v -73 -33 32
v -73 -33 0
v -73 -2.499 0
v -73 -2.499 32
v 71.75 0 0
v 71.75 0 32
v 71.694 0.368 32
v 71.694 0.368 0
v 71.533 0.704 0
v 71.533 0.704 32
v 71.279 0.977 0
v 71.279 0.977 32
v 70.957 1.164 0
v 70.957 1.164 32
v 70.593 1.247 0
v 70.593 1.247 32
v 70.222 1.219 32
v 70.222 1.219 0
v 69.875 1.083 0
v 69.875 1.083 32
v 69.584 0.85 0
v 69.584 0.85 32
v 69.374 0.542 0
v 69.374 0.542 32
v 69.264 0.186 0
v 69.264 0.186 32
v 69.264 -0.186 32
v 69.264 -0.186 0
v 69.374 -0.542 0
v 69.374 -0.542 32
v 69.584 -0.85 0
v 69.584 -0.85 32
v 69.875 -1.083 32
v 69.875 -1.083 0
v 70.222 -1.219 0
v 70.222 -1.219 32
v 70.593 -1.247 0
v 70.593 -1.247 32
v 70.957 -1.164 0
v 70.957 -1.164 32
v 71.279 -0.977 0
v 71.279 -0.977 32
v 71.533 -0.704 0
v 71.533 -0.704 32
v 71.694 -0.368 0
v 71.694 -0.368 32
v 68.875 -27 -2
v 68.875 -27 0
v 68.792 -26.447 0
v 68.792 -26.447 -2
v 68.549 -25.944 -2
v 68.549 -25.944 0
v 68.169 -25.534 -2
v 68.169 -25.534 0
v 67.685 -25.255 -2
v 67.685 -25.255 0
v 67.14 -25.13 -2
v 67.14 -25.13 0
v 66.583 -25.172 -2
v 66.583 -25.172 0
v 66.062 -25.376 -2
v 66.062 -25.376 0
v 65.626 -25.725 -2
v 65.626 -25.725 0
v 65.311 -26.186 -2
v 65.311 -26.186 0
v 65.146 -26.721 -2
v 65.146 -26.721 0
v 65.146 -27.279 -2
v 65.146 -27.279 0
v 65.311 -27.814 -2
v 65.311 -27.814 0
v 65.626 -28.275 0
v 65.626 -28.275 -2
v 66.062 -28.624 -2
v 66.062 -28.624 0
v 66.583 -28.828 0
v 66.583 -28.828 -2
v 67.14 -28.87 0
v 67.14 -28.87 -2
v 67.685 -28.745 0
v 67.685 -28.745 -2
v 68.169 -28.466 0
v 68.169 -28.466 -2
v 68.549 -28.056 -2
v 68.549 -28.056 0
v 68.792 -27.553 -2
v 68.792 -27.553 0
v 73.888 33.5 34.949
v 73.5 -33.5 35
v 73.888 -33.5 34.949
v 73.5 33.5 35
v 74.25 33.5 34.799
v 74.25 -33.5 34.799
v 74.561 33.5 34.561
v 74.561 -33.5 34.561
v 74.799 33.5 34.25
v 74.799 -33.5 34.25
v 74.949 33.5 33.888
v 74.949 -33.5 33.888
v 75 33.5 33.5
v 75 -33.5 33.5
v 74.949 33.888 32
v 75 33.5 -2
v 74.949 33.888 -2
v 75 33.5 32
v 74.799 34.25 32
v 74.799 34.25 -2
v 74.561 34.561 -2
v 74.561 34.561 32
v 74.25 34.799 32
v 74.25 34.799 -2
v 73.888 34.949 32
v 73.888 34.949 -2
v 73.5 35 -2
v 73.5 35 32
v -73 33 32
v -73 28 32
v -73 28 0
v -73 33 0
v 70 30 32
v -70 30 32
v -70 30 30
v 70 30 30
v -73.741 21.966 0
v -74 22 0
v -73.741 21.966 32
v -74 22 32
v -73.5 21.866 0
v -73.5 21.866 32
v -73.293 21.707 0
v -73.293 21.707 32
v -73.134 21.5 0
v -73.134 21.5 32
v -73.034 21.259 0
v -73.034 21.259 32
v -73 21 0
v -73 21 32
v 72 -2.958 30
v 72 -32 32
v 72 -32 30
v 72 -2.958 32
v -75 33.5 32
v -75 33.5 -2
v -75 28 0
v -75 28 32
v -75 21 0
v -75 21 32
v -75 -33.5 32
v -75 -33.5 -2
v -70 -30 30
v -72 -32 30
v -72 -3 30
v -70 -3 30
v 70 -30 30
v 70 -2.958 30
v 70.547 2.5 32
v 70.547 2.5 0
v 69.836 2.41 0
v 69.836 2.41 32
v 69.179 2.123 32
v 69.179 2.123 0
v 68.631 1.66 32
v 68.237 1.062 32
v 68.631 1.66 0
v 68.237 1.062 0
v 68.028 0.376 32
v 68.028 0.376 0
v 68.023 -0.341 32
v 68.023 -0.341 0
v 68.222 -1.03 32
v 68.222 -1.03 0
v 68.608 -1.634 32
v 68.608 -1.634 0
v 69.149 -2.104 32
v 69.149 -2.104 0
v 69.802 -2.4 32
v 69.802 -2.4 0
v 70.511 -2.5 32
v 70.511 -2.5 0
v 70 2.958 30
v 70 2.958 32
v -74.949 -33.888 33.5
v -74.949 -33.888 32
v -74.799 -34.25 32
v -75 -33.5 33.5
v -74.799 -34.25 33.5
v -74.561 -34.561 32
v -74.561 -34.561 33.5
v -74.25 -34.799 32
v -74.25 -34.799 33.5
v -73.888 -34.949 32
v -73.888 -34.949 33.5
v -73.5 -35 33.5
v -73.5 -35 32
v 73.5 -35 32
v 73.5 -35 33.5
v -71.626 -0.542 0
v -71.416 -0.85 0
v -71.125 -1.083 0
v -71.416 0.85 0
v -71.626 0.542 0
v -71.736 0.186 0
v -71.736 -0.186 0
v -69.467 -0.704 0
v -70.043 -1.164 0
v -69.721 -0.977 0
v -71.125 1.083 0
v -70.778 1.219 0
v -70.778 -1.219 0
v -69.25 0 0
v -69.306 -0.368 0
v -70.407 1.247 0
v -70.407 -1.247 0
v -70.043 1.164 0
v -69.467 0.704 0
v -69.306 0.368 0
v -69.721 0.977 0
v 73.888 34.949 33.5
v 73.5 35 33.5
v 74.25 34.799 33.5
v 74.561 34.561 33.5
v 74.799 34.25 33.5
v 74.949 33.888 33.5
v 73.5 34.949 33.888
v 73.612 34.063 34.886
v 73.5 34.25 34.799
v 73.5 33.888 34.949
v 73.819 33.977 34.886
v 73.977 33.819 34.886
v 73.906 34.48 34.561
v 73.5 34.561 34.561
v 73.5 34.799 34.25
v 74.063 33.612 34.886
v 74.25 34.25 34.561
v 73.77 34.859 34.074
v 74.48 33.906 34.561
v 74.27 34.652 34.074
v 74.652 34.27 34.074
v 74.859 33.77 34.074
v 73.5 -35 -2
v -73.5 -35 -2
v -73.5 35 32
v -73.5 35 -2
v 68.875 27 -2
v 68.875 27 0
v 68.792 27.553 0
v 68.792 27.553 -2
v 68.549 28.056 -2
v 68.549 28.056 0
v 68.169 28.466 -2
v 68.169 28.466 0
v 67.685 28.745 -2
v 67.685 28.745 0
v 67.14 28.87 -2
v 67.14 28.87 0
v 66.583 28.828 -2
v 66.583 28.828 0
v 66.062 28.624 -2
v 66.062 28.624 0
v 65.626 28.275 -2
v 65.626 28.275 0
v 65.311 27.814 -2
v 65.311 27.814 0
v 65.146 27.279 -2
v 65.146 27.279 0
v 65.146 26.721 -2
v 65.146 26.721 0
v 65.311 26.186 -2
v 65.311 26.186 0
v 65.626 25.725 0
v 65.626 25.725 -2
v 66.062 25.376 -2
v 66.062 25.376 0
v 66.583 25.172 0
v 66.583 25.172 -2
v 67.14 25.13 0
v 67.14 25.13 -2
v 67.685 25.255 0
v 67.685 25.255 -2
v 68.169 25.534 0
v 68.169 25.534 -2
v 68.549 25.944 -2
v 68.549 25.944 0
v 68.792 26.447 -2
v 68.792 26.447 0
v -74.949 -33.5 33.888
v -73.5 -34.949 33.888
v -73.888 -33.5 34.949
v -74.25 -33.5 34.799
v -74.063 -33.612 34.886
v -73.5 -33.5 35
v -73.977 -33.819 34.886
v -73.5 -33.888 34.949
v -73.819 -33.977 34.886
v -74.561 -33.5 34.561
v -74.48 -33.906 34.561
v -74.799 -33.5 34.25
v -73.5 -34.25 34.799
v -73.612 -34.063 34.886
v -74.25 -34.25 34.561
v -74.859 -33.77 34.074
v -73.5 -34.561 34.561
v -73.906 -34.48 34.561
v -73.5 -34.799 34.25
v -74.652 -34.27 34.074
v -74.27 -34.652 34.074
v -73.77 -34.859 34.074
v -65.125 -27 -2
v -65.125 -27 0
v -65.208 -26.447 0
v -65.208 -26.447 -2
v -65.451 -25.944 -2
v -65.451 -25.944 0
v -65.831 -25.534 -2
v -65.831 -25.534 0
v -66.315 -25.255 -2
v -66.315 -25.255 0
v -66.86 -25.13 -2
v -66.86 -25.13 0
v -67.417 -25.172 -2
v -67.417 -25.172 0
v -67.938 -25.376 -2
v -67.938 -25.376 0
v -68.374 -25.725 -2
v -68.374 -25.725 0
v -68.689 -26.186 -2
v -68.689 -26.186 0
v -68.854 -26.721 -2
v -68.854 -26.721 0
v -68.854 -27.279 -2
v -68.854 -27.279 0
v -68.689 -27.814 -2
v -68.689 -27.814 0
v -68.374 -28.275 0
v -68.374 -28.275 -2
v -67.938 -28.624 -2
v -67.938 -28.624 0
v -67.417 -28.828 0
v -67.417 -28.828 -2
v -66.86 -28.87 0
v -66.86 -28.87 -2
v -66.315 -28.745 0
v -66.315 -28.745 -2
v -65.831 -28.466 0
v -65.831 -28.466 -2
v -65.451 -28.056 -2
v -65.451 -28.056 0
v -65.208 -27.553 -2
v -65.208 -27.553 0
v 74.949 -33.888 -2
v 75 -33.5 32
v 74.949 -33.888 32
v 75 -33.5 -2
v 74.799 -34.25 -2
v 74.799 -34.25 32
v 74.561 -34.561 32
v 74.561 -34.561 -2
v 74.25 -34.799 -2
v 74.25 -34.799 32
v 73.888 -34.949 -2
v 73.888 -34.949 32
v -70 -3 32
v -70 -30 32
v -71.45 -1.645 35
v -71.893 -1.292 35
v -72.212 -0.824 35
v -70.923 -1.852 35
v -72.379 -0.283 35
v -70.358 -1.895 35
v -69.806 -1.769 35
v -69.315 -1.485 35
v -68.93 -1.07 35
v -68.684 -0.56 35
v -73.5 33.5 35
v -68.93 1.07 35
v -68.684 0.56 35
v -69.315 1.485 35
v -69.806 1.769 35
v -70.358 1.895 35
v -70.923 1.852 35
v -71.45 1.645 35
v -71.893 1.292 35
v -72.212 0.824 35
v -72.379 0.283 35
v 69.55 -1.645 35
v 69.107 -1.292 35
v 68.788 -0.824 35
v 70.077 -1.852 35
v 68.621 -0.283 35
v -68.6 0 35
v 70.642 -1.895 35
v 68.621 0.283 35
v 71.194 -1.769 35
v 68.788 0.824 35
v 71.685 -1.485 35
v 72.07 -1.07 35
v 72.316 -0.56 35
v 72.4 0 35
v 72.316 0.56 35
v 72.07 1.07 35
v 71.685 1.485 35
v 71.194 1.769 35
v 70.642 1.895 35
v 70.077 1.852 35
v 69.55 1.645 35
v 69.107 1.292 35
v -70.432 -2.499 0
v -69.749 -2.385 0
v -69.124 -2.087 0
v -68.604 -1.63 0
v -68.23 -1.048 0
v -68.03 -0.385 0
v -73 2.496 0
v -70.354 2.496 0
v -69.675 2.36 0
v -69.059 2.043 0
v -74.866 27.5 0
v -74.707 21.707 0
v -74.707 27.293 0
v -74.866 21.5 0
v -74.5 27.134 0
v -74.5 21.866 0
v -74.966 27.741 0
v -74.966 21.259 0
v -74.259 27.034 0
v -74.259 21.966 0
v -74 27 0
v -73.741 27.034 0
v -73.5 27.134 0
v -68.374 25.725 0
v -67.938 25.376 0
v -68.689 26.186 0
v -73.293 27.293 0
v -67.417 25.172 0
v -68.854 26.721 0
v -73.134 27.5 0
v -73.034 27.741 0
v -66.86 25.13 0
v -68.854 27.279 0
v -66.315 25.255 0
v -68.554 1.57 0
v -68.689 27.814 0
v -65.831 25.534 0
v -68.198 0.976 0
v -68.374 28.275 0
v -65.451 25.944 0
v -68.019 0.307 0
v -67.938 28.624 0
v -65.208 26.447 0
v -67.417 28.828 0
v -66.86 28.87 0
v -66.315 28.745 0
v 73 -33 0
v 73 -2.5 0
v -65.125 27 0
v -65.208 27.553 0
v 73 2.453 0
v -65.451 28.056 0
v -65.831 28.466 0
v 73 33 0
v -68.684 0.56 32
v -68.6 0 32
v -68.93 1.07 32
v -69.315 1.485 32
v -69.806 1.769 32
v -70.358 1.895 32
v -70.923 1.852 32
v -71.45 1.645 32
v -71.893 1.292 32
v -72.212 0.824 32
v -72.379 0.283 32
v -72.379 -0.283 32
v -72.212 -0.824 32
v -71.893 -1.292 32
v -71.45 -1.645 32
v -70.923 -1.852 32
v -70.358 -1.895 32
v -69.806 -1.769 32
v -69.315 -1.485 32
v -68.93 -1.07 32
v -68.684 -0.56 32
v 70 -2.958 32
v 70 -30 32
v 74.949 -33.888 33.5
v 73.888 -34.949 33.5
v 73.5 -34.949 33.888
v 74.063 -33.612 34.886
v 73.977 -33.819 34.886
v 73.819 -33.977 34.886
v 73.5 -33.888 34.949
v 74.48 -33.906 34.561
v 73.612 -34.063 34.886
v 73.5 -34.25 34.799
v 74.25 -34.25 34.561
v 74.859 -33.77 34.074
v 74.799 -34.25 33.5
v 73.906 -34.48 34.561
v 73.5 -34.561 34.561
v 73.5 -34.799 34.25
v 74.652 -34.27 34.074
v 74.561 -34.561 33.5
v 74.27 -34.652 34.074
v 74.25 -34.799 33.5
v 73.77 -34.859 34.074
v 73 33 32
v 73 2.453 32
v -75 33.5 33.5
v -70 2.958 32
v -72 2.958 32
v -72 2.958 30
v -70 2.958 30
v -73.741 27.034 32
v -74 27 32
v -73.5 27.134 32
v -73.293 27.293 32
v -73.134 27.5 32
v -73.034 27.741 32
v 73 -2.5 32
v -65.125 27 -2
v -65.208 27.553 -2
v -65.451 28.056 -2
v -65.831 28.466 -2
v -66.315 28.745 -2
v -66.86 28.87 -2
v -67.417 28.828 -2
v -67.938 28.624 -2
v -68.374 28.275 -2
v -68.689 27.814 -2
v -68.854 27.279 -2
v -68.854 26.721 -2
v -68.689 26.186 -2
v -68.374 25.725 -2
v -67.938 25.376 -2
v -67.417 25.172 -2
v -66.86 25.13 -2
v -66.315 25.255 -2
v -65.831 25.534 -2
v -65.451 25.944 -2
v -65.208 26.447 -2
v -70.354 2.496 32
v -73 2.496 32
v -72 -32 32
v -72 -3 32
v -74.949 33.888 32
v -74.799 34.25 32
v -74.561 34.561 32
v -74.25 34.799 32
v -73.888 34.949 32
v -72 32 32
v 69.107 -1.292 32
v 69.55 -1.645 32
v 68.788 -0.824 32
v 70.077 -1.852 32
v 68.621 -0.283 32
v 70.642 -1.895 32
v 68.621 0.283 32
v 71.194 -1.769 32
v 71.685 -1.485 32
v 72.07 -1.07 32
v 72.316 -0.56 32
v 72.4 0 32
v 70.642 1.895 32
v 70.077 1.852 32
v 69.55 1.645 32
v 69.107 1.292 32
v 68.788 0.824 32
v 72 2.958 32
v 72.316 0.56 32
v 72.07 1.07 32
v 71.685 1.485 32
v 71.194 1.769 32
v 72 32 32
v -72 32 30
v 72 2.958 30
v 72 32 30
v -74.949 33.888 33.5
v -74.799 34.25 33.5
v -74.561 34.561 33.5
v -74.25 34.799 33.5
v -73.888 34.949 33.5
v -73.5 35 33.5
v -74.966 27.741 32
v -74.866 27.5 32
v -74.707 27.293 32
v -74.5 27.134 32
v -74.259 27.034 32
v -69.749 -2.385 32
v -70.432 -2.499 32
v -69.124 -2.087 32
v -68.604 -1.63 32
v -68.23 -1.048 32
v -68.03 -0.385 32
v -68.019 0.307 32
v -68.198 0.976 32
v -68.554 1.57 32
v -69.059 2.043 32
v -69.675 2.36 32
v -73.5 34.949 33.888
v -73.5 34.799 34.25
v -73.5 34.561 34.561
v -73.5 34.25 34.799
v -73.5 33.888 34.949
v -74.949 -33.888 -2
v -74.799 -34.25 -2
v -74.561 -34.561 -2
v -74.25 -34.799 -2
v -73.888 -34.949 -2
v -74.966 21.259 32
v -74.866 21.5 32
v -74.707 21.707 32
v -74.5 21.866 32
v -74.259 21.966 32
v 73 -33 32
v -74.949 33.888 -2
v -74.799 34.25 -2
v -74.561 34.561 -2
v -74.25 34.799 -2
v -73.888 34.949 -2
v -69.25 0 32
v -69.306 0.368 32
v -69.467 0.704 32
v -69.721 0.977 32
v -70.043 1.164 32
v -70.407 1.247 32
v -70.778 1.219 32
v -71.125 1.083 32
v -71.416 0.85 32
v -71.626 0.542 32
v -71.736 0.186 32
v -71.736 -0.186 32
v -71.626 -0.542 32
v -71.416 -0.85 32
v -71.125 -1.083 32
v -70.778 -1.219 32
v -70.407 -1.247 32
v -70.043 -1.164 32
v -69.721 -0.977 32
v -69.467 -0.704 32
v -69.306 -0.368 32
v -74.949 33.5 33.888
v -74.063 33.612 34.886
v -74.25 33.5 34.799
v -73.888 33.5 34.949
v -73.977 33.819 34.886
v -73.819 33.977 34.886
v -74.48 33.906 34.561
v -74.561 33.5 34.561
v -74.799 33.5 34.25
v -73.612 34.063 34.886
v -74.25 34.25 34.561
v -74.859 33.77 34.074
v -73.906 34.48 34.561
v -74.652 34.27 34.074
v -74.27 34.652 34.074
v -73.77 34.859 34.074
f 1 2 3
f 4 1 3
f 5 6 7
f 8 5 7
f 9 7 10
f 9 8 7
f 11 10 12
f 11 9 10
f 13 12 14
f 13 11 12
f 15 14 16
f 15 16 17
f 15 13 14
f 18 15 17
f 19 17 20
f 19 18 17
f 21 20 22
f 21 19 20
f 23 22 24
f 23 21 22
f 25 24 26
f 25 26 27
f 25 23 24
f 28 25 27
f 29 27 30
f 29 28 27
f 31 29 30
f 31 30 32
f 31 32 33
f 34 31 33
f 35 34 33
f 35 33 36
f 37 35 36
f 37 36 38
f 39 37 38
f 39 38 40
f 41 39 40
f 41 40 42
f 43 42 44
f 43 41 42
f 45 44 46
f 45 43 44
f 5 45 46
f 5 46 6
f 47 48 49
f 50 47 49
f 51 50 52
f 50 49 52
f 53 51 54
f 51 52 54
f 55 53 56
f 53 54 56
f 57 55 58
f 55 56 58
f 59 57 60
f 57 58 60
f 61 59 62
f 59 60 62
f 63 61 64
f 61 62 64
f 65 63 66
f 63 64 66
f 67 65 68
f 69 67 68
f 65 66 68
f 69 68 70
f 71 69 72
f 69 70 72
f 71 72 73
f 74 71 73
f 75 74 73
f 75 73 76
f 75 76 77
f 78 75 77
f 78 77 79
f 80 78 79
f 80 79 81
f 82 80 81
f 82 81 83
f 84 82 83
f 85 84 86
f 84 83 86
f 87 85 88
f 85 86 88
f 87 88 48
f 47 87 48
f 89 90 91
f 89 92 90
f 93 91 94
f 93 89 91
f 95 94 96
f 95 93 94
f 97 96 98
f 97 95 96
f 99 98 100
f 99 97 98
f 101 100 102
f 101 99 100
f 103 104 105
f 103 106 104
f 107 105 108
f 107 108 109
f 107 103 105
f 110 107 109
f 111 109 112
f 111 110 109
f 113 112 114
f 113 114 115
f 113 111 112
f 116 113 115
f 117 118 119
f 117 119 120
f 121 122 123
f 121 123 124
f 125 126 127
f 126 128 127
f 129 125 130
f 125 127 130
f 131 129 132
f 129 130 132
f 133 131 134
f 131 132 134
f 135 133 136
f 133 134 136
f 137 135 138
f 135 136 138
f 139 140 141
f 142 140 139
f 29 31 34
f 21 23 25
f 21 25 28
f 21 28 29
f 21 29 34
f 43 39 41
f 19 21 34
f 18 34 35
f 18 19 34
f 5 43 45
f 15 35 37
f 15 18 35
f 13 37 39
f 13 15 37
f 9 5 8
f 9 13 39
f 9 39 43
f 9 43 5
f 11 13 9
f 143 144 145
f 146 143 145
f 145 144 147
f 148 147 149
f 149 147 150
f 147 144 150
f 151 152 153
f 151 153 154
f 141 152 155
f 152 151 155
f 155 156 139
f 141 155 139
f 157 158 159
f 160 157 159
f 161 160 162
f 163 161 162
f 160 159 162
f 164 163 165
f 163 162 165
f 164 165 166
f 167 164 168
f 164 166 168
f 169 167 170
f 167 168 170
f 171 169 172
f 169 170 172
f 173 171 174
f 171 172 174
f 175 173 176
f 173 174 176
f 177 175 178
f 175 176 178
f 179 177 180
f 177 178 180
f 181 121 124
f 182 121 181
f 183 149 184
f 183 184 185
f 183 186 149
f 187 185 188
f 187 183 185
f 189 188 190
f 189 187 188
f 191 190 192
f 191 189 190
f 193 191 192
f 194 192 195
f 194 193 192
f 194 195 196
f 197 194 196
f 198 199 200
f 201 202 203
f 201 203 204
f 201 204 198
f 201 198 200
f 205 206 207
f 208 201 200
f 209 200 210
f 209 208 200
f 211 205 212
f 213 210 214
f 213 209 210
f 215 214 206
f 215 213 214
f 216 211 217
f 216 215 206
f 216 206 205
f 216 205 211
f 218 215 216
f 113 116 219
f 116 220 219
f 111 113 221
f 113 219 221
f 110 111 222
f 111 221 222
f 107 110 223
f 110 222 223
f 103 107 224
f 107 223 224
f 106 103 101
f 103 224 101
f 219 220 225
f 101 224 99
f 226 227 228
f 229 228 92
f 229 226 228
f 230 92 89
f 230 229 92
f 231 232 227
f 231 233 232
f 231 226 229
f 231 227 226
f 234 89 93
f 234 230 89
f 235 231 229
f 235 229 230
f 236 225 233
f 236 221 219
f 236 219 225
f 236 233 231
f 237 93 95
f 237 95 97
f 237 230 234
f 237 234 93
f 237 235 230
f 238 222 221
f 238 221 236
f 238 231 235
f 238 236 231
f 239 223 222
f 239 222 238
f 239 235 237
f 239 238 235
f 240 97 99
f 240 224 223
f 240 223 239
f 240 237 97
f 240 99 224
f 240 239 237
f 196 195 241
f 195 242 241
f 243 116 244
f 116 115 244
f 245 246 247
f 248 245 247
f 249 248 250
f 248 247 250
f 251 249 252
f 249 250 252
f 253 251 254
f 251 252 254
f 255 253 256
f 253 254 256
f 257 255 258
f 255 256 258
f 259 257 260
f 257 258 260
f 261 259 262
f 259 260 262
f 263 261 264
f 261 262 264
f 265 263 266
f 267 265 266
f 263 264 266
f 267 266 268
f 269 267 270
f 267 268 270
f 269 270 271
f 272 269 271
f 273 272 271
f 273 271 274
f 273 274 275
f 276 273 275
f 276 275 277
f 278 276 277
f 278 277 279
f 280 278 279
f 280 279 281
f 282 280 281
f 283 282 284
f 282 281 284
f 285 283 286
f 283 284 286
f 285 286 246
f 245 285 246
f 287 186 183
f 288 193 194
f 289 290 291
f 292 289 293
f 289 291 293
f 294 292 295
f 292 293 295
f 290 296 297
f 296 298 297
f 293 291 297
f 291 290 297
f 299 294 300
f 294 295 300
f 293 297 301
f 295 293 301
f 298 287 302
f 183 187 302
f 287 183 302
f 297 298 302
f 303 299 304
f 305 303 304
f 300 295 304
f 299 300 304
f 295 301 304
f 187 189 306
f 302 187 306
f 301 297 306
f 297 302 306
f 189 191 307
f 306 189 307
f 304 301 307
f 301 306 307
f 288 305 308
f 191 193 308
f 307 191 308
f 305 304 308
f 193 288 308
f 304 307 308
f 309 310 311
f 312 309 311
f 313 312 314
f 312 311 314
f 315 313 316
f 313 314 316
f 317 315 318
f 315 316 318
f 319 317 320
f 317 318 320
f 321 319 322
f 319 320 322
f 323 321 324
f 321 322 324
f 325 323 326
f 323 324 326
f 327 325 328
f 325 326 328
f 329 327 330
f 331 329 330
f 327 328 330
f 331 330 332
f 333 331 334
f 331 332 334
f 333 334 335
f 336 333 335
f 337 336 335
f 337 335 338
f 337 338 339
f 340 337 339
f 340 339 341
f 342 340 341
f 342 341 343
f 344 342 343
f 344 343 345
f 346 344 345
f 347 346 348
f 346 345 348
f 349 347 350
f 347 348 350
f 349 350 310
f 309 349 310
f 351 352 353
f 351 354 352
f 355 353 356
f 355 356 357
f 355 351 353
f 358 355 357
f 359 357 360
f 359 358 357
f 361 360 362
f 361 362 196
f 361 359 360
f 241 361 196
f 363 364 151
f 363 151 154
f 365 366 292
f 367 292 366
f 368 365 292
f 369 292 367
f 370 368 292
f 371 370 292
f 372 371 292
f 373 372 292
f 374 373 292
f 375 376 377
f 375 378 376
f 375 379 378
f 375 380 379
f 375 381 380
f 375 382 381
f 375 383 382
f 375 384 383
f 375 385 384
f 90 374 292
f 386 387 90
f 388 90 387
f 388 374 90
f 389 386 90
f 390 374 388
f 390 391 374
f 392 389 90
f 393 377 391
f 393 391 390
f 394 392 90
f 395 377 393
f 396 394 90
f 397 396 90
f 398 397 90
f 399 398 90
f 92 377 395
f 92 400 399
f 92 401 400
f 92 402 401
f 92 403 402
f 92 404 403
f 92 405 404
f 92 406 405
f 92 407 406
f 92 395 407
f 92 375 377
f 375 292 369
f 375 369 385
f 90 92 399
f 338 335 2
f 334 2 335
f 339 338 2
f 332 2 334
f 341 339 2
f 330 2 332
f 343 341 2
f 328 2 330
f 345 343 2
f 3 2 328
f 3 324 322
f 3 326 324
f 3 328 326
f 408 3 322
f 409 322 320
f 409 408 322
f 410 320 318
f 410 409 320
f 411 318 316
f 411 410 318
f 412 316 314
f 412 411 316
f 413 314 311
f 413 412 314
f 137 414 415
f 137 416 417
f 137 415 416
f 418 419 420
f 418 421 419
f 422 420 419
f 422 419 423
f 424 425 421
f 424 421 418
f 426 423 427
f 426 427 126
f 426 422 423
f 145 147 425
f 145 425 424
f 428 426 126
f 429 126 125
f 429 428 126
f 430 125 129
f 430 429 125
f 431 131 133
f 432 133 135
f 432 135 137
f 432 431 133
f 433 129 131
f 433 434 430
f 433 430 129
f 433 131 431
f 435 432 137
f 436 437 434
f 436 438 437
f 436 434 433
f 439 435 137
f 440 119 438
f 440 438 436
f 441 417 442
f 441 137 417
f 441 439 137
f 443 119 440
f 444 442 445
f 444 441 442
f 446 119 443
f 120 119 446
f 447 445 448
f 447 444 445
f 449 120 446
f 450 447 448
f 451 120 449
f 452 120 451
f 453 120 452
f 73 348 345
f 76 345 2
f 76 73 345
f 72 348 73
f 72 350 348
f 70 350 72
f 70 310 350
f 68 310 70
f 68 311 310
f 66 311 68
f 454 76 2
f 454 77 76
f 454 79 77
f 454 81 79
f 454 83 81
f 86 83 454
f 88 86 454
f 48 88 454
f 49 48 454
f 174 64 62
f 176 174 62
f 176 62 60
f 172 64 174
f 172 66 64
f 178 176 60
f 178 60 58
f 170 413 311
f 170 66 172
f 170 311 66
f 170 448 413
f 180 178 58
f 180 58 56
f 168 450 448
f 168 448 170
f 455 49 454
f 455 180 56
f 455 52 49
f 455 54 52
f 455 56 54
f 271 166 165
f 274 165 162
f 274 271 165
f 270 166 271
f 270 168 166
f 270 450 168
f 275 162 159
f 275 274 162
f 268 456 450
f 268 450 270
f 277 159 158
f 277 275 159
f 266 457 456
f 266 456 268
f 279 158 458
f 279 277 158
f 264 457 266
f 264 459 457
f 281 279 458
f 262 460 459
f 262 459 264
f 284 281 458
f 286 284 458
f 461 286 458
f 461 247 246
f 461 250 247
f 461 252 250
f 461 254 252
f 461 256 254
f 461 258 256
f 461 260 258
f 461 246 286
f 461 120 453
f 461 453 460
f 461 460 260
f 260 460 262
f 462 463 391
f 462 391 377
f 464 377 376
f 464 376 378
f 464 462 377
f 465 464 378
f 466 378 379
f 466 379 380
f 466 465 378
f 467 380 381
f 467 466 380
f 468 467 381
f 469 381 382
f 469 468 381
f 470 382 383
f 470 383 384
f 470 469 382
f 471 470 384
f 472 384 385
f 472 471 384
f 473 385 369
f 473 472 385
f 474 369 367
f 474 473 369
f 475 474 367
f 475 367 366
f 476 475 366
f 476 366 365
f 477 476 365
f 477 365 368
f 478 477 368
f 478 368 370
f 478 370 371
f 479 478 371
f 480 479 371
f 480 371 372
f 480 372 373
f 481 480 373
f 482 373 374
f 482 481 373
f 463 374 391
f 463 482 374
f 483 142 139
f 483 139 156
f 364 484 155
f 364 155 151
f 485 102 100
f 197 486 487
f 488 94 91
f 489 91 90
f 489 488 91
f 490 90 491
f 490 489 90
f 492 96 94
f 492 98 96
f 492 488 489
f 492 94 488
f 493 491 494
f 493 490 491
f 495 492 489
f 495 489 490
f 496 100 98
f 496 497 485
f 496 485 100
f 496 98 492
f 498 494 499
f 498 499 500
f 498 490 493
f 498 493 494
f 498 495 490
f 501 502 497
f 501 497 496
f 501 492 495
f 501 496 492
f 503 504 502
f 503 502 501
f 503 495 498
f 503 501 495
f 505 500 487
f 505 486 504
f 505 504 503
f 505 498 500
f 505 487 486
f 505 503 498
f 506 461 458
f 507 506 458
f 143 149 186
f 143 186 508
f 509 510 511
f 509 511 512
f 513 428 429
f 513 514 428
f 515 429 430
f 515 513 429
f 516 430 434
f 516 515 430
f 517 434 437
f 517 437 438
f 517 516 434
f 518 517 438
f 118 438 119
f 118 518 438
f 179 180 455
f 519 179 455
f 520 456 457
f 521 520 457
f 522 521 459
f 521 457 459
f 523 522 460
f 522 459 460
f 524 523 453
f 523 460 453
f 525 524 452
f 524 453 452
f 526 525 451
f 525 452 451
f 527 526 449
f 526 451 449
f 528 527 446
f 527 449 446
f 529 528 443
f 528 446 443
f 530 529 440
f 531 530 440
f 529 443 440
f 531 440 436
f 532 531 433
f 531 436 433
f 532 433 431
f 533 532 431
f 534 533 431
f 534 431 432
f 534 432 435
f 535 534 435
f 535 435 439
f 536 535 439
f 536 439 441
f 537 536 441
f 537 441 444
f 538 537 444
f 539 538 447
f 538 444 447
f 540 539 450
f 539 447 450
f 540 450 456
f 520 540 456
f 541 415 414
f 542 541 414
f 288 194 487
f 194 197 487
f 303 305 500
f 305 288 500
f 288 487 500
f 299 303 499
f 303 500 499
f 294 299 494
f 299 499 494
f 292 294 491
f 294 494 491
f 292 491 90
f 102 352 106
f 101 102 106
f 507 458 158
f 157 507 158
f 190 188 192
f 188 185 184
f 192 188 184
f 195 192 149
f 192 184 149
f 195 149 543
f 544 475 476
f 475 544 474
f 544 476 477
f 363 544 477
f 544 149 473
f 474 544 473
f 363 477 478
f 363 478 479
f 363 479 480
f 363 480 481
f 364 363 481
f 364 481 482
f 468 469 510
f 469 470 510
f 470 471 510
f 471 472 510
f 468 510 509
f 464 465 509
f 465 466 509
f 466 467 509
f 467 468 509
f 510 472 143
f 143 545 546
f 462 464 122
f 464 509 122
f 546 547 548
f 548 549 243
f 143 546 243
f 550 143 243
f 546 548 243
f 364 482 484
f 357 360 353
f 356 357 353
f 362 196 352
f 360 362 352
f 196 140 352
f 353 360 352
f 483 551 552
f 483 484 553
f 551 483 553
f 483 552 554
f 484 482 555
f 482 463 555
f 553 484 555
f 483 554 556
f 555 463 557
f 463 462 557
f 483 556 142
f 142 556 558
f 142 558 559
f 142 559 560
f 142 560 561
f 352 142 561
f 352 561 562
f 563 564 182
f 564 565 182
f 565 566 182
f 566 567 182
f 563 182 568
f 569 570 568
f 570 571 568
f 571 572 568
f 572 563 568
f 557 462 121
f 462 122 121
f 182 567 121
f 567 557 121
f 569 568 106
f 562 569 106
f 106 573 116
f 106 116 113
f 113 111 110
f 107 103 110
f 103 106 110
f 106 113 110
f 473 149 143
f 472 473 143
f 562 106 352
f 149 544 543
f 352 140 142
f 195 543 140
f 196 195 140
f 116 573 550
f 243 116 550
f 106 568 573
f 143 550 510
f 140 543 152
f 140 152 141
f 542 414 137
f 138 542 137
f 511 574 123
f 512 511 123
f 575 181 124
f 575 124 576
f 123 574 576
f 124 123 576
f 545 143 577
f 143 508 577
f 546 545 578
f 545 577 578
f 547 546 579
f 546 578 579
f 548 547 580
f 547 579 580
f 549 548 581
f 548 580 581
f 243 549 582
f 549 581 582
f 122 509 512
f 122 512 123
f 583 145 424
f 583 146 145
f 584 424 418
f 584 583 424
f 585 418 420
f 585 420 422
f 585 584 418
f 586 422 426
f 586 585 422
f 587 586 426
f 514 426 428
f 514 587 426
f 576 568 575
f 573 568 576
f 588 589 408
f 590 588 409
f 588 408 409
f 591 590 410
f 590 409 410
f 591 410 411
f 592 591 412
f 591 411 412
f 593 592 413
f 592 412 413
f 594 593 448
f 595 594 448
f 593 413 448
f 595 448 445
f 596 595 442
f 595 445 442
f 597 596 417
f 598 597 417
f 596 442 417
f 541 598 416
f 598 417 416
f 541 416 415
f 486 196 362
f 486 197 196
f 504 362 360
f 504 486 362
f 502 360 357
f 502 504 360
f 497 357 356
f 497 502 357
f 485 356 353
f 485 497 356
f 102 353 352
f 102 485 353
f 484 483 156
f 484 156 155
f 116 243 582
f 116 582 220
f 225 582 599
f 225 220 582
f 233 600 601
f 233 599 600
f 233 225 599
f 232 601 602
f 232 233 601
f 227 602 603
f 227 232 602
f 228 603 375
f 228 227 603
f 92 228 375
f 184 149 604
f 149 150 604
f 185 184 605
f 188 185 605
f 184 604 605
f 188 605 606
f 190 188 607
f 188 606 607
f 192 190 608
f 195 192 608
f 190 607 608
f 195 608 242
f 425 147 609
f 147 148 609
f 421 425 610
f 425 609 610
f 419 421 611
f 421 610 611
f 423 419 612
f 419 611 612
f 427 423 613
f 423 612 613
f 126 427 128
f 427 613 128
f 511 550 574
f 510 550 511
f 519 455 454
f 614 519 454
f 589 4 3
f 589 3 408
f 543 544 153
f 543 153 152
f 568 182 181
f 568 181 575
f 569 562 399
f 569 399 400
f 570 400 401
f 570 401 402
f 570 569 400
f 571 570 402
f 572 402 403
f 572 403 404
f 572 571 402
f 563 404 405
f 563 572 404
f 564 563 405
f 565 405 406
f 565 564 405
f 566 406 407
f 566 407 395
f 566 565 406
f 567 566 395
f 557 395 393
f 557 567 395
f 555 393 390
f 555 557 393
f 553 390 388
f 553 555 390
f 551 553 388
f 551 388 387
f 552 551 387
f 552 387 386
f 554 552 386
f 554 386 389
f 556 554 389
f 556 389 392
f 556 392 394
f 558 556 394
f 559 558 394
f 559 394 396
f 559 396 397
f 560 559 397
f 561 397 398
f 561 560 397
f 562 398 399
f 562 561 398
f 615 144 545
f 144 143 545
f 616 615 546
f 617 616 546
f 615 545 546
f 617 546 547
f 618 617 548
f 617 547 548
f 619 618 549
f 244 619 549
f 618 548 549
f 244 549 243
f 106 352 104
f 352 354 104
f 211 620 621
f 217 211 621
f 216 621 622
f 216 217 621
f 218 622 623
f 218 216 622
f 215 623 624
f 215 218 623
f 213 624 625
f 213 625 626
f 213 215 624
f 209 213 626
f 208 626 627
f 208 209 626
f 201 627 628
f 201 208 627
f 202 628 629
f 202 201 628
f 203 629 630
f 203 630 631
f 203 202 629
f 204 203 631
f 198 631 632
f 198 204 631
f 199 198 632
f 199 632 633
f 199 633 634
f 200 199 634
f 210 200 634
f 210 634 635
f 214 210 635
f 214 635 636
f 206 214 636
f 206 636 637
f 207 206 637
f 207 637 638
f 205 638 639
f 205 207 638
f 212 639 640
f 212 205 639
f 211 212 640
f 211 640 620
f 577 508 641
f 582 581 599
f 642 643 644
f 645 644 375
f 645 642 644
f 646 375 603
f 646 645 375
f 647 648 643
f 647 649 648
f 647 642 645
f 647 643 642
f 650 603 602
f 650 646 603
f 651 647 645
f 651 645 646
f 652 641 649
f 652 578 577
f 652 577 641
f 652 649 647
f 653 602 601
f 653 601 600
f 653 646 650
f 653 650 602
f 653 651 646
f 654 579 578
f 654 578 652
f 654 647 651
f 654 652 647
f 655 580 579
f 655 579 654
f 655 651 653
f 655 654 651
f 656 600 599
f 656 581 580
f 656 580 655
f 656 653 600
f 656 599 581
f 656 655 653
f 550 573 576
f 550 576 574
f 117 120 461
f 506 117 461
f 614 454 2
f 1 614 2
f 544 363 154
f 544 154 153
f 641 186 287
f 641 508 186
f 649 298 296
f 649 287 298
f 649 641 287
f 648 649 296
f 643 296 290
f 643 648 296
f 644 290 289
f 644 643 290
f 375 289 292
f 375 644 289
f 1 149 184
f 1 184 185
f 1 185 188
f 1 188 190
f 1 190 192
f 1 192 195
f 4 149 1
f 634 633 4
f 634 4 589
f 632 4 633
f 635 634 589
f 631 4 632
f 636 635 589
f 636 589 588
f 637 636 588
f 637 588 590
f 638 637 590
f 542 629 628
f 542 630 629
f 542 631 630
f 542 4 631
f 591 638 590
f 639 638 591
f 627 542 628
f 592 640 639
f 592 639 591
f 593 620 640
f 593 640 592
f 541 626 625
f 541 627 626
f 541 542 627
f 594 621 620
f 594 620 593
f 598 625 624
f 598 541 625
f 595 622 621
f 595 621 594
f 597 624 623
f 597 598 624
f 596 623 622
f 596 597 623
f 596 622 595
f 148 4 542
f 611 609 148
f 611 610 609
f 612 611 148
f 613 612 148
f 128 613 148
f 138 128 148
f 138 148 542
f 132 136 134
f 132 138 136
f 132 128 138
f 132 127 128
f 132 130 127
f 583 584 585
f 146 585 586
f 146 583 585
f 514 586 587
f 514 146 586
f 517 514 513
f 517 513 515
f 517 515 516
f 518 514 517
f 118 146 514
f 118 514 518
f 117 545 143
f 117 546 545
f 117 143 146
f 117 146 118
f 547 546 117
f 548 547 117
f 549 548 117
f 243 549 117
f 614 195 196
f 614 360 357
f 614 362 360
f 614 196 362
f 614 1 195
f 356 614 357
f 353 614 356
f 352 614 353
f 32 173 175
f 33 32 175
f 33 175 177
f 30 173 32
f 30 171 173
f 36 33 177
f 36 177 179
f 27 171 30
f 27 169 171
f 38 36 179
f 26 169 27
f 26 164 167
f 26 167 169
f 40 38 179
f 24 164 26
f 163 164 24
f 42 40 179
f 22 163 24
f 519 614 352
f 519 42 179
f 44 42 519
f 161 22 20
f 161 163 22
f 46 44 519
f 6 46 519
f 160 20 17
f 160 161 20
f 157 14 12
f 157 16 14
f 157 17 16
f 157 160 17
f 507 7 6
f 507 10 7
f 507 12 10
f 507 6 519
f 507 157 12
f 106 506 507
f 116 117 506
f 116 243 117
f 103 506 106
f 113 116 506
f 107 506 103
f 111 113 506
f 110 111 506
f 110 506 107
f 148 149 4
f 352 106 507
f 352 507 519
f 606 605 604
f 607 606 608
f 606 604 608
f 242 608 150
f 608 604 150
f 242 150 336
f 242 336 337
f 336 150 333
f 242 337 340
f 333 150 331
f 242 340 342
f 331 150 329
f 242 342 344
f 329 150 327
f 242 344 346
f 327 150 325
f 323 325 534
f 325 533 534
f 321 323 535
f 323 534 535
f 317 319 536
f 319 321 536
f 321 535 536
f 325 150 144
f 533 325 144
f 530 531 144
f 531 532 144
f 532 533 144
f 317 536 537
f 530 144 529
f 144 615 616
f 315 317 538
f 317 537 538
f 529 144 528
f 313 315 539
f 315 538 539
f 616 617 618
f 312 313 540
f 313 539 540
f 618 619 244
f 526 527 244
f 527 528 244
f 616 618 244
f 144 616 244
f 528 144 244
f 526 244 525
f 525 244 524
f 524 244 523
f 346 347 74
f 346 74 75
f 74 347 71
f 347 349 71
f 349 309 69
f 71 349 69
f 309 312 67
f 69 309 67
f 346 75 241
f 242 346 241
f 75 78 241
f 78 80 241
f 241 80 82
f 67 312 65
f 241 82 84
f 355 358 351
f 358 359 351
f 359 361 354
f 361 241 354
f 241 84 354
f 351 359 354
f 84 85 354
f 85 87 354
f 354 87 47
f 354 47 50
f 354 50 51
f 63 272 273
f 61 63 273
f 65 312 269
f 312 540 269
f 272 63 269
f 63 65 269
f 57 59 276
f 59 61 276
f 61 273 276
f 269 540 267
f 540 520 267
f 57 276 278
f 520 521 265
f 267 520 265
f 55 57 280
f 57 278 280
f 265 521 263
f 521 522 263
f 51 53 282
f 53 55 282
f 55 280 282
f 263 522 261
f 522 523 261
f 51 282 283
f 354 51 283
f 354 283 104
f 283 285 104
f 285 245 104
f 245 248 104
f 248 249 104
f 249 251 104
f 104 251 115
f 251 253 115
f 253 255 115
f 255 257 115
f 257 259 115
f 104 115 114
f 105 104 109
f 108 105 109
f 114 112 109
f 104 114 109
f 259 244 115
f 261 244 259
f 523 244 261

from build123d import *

# Parameters (mm, degrees)
F0_W     = 150
F0_H     = 70
F0_R     = 1.875
F1_DEPTH = 2
F2_R     = 1.25
F3_DEPTH = 32
F4_W     = 150
F4_H     = 70
F4_R     = 1.9
F5_DEPTH = 3
F7_DEPTH = 2
F8_R     = 1.5
F8_2_R   = 1.5
F9_R     = 0.99999


# Not quite as in the source:
# - a fillet or chamfer is up to 0.001 mm smaller than in the source, because OpenCascade refuses the exact size


with BuildPart() as f1:
    # F0 (on Top) → F1 (new body)
    with BuildSketch(Plane.XY):
        Rectangle(F0_W, F0_H)
        with Locations((-67, -27)):
            Circle(F0_R, mode=Mode.SUBTRACT)
        with Locations((67, -27)):
            Circle(F0_R, mode=Mode.SUBTRACT)
        with Locations((-67, 27)):
            Circle(F0_R, mode=Mode.SUBTRACT)
        with Locations((67, 27)):
            Circle(F0_R, mode=Mode.SUBTRACT)
    extrude(amount=-F1_DEPTH)

    # F2 (on Top) → F3 (join)
    with BuildSketch(Plane.XY):
        with BuildLine():
            Line((75, -35), (75, 35))
            Line((75, 35), (-75, 35))
            Line((-75, 35), (-75, 27))
            Line((-75, 27), (-73, 27))
            Line((-73, 27), (-73, 33))
            Line((-73, 33), (73, 33))
            Line((73, 33), (73, 2.4534972628))
            Line((73, 2.4534972628), (70.5469351619, 2.4995593793))
            ThreePointArc((70.5469351619, 2.4995593793), (68.0000628641, 0.0177289705), (70.5114796409, -2.4999736434))
            Line((70.5114796409, -2.4999736434), (73, -2.4999736434))
            Line((73, -2.4999736434), (73, -33))
            Line((73, -33), (-73, -33))
            Line((-73, -33), (-73, -2.4990718681))
            Line((-73, -2.4990718681), (-70.5681160628, -2.4990718681))
            Line((-70.5681160628, -2.4990718681), (-70.4318839372, -2.4990718681))
            ThreePointArc((-70.4318839372, -2.4990718681), (-68.0003076438, -0.0392189257), (-70.3535183815, 2.4957049376))
            Line((-70.3535183815, 2.4957049376), (-70.6464816185, 2.4957049376))
            Line((-70.6464816185, 2.4957049376), (-73, 2.4957049376))
            Line((-73, 2.4957049376), (-73, 22))
            Line((-73, 22), (-75, 22))
            Line((-75, 22), (-75, -35))
            Line((-75, -35), (75, -35))
        make_face()
        with Locations((-70.5, 0)):
            Circle(F2_R, mode=Mode.SUBTRACT)
        with Locations((70.5, 0)):
            Circle(F2_R, mode=Mode.SUBTRACT)
    extrude(amount=F3_DEPTH)

    # F8
    f8_edges = [f1.edges().sort_by_distance(p)[0] for p in [
        (-75, -35, 15),
        (75, -35, 15),
        (75, 35, 15),
        (-75, 35, 15),
    ]]
    fillet(f8_edges, radius=F8_R)

    # F9 (radius 1 in the source; OpenCascade refuses exactly that, so slightly less here)
    f9_edges = [f1.edges().sort_by_distance(p)[0] for p in [
        (-75, 22, 16),
        (-73, 22, 16),
        (-75, 27, 16),
        (-73, 27, 16),
    ]]
    fillet(f9_edges, radius=F9_R)


with BuildPart() as f5:
    # F4 (on face) → F5 (new body)
    with BuildSketch(Plane.XY.offset(32)):
        Rectangle(F4_W, F4_H)
        with Locations((-70.5, 0)):
            Circle(F4_R, mode=Mode.SUBTRACT)
        with Locations((70.5, 0)):
            Circle(F4_R, mode=Mode.SUBTRACT)
    extrude(amount=F5_DEPTH)

    # F6 (on face) → F7 (join)
    with BuildSketch(Plane.XY.offset(32)):
        Polygon((-72, -3), (-72, -32), (72, -32), (72, -2.9580398915), (70, -2.9580398915), (70, -30), (-70, -30), (-70, -3), align=None)
        Polygon((72, 32), (-72, 32), (-72, 2.9580398915), (-70, 2.9580398915), (-70, 30), (70, 30), (70, 2.9580398915), (72, 2.9580398915), align=None)
    extrude(amount=-F7_DEPTH)

    # F8#2
    f8_2_edges = [f5.edges().sort_by_distance(p)[0] for p in [
        (-75, -35, 33.5),
        (-75, 35, 33.5),
        (75, 35, 33.5),
        (75, -35, 33.5),
        (-75, 0, 35),
        (0, 35, 35),
        (75, 0, 35),
        (0, -35, 35),
    ]]
    fillet(f8_2_edges, radius=F8_2_R)


solid = Compound([f1.part, f5.part])
